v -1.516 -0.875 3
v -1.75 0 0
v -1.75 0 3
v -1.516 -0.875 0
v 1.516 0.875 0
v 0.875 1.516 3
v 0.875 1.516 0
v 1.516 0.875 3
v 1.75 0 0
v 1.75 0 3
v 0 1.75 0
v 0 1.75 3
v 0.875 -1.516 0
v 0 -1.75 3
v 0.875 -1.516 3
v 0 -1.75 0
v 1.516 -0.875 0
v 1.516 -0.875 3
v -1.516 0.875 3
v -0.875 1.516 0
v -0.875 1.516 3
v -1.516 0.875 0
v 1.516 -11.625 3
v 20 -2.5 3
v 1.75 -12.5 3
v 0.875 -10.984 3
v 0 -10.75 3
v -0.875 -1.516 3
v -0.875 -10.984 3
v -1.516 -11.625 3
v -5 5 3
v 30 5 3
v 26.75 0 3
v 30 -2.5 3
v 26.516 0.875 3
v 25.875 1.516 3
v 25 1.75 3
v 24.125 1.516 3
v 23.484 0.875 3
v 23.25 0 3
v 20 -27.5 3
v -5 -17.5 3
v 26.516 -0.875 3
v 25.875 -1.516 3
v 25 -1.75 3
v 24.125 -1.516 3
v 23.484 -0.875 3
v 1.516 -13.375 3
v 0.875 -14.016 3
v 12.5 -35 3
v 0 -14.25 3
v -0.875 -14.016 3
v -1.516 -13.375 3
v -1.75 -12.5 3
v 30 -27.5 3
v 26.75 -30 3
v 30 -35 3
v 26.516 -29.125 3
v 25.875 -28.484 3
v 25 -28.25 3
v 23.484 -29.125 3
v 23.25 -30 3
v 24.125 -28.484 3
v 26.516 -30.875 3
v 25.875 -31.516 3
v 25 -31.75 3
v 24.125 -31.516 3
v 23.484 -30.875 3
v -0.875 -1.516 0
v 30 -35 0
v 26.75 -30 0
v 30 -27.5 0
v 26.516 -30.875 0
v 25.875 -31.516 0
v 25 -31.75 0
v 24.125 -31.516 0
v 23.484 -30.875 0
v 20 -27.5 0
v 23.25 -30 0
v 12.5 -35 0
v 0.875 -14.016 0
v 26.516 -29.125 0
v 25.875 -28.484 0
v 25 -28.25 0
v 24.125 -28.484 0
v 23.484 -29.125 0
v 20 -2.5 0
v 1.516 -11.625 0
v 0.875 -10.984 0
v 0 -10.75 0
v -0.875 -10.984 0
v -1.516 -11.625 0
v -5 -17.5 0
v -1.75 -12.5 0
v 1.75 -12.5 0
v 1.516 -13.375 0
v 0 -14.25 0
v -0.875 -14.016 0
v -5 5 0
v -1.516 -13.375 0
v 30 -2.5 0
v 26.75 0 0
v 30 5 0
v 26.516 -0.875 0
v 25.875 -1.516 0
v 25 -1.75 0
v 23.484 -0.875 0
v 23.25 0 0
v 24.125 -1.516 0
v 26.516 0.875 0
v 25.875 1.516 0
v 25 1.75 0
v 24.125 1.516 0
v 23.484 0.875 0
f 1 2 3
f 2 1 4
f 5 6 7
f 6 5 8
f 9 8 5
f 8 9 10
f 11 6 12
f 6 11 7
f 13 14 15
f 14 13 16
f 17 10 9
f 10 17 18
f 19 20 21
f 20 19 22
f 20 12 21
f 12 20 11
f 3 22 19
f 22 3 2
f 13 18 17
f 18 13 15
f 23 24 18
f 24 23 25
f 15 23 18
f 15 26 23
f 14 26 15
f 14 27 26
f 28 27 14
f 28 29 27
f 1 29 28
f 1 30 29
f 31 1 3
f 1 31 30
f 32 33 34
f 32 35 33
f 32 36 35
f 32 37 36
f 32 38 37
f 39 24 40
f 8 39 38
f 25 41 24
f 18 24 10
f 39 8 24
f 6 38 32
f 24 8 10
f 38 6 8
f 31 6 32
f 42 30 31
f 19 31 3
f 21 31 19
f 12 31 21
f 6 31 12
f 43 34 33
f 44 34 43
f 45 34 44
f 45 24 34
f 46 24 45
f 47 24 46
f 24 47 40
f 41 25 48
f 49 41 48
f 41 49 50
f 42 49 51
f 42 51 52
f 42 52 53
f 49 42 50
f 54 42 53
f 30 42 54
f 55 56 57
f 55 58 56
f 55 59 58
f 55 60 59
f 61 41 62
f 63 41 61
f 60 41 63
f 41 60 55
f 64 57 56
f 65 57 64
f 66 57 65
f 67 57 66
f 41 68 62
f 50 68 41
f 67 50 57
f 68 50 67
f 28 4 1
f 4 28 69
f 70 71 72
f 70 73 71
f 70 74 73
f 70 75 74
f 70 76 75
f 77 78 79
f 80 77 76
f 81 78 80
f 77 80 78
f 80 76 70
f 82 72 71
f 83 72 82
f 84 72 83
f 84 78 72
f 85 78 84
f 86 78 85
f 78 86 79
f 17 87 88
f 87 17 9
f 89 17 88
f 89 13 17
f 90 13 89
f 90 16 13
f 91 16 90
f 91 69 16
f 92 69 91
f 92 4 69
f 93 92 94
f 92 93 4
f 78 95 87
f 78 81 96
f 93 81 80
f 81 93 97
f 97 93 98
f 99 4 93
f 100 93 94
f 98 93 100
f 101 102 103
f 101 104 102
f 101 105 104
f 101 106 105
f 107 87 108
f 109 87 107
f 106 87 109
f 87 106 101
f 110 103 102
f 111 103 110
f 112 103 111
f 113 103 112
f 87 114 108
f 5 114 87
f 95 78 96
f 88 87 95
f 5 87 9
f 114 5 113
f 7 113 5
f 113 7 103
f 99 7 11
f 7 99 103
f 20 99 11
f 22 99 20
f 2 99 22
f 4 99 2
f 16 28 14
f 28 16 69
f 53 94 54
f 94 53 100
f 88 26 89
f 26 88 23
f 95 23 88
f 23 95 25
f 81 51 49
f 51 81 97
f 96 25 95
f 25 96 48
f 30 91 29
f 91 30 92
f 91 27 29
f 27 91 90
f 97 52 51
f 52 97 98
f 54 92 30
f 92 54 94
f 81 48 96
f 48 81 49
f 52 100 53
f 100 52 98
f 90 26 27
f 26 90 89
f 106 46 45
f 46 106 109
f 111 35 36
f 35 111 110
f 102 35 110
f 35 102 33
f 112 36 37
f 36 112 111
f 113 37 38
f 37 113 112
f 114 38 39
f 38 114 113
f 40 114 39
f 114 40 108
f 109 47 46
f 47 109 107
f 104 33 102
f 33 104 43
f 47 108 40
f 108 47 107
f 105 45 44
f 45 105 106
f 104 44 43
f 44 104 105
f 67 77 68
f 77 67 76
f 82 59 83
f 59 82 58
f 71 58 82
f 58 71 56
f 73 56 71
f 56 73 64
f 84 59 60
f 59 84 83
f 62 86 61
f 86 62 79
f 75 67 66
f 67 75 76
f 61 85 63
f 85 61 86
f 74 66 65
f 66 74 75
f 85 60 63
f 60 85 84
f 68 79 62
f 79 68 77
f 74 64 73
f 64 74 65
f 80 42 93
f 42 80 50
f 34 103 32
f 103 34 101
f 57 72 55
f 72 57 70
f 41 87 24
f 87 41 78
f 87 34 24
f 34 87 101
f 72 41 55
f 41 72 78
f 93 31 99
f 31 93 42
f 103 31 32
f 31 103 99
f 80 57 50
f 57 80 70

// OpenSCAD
difference()
{
    union()
    {
        translate([-5,-35,0])
            cube([25+10,30+10,3]);
    }
    union()
    {
        translate([0,0,0])
            cylinder(d=3.5,h=3,$fn=12);
        translate([0,-12.5,0])
            cylinder(d=3.5,h=3,$fn=12);
        
        translate([25,0,0])
            cylinder(d=3.5,h=3,$fn=12);
        translate([25,-30,0])
            cylinder(d=3.5,h=3,$fn=12);
        
        translate([-5,-12.5-5,0])
            rotate([0,0,45+180])
                cube([25,25,3]);
       
        translate([20,15/2-5-30,0])
            cube([10,25,3]);
    }
}
